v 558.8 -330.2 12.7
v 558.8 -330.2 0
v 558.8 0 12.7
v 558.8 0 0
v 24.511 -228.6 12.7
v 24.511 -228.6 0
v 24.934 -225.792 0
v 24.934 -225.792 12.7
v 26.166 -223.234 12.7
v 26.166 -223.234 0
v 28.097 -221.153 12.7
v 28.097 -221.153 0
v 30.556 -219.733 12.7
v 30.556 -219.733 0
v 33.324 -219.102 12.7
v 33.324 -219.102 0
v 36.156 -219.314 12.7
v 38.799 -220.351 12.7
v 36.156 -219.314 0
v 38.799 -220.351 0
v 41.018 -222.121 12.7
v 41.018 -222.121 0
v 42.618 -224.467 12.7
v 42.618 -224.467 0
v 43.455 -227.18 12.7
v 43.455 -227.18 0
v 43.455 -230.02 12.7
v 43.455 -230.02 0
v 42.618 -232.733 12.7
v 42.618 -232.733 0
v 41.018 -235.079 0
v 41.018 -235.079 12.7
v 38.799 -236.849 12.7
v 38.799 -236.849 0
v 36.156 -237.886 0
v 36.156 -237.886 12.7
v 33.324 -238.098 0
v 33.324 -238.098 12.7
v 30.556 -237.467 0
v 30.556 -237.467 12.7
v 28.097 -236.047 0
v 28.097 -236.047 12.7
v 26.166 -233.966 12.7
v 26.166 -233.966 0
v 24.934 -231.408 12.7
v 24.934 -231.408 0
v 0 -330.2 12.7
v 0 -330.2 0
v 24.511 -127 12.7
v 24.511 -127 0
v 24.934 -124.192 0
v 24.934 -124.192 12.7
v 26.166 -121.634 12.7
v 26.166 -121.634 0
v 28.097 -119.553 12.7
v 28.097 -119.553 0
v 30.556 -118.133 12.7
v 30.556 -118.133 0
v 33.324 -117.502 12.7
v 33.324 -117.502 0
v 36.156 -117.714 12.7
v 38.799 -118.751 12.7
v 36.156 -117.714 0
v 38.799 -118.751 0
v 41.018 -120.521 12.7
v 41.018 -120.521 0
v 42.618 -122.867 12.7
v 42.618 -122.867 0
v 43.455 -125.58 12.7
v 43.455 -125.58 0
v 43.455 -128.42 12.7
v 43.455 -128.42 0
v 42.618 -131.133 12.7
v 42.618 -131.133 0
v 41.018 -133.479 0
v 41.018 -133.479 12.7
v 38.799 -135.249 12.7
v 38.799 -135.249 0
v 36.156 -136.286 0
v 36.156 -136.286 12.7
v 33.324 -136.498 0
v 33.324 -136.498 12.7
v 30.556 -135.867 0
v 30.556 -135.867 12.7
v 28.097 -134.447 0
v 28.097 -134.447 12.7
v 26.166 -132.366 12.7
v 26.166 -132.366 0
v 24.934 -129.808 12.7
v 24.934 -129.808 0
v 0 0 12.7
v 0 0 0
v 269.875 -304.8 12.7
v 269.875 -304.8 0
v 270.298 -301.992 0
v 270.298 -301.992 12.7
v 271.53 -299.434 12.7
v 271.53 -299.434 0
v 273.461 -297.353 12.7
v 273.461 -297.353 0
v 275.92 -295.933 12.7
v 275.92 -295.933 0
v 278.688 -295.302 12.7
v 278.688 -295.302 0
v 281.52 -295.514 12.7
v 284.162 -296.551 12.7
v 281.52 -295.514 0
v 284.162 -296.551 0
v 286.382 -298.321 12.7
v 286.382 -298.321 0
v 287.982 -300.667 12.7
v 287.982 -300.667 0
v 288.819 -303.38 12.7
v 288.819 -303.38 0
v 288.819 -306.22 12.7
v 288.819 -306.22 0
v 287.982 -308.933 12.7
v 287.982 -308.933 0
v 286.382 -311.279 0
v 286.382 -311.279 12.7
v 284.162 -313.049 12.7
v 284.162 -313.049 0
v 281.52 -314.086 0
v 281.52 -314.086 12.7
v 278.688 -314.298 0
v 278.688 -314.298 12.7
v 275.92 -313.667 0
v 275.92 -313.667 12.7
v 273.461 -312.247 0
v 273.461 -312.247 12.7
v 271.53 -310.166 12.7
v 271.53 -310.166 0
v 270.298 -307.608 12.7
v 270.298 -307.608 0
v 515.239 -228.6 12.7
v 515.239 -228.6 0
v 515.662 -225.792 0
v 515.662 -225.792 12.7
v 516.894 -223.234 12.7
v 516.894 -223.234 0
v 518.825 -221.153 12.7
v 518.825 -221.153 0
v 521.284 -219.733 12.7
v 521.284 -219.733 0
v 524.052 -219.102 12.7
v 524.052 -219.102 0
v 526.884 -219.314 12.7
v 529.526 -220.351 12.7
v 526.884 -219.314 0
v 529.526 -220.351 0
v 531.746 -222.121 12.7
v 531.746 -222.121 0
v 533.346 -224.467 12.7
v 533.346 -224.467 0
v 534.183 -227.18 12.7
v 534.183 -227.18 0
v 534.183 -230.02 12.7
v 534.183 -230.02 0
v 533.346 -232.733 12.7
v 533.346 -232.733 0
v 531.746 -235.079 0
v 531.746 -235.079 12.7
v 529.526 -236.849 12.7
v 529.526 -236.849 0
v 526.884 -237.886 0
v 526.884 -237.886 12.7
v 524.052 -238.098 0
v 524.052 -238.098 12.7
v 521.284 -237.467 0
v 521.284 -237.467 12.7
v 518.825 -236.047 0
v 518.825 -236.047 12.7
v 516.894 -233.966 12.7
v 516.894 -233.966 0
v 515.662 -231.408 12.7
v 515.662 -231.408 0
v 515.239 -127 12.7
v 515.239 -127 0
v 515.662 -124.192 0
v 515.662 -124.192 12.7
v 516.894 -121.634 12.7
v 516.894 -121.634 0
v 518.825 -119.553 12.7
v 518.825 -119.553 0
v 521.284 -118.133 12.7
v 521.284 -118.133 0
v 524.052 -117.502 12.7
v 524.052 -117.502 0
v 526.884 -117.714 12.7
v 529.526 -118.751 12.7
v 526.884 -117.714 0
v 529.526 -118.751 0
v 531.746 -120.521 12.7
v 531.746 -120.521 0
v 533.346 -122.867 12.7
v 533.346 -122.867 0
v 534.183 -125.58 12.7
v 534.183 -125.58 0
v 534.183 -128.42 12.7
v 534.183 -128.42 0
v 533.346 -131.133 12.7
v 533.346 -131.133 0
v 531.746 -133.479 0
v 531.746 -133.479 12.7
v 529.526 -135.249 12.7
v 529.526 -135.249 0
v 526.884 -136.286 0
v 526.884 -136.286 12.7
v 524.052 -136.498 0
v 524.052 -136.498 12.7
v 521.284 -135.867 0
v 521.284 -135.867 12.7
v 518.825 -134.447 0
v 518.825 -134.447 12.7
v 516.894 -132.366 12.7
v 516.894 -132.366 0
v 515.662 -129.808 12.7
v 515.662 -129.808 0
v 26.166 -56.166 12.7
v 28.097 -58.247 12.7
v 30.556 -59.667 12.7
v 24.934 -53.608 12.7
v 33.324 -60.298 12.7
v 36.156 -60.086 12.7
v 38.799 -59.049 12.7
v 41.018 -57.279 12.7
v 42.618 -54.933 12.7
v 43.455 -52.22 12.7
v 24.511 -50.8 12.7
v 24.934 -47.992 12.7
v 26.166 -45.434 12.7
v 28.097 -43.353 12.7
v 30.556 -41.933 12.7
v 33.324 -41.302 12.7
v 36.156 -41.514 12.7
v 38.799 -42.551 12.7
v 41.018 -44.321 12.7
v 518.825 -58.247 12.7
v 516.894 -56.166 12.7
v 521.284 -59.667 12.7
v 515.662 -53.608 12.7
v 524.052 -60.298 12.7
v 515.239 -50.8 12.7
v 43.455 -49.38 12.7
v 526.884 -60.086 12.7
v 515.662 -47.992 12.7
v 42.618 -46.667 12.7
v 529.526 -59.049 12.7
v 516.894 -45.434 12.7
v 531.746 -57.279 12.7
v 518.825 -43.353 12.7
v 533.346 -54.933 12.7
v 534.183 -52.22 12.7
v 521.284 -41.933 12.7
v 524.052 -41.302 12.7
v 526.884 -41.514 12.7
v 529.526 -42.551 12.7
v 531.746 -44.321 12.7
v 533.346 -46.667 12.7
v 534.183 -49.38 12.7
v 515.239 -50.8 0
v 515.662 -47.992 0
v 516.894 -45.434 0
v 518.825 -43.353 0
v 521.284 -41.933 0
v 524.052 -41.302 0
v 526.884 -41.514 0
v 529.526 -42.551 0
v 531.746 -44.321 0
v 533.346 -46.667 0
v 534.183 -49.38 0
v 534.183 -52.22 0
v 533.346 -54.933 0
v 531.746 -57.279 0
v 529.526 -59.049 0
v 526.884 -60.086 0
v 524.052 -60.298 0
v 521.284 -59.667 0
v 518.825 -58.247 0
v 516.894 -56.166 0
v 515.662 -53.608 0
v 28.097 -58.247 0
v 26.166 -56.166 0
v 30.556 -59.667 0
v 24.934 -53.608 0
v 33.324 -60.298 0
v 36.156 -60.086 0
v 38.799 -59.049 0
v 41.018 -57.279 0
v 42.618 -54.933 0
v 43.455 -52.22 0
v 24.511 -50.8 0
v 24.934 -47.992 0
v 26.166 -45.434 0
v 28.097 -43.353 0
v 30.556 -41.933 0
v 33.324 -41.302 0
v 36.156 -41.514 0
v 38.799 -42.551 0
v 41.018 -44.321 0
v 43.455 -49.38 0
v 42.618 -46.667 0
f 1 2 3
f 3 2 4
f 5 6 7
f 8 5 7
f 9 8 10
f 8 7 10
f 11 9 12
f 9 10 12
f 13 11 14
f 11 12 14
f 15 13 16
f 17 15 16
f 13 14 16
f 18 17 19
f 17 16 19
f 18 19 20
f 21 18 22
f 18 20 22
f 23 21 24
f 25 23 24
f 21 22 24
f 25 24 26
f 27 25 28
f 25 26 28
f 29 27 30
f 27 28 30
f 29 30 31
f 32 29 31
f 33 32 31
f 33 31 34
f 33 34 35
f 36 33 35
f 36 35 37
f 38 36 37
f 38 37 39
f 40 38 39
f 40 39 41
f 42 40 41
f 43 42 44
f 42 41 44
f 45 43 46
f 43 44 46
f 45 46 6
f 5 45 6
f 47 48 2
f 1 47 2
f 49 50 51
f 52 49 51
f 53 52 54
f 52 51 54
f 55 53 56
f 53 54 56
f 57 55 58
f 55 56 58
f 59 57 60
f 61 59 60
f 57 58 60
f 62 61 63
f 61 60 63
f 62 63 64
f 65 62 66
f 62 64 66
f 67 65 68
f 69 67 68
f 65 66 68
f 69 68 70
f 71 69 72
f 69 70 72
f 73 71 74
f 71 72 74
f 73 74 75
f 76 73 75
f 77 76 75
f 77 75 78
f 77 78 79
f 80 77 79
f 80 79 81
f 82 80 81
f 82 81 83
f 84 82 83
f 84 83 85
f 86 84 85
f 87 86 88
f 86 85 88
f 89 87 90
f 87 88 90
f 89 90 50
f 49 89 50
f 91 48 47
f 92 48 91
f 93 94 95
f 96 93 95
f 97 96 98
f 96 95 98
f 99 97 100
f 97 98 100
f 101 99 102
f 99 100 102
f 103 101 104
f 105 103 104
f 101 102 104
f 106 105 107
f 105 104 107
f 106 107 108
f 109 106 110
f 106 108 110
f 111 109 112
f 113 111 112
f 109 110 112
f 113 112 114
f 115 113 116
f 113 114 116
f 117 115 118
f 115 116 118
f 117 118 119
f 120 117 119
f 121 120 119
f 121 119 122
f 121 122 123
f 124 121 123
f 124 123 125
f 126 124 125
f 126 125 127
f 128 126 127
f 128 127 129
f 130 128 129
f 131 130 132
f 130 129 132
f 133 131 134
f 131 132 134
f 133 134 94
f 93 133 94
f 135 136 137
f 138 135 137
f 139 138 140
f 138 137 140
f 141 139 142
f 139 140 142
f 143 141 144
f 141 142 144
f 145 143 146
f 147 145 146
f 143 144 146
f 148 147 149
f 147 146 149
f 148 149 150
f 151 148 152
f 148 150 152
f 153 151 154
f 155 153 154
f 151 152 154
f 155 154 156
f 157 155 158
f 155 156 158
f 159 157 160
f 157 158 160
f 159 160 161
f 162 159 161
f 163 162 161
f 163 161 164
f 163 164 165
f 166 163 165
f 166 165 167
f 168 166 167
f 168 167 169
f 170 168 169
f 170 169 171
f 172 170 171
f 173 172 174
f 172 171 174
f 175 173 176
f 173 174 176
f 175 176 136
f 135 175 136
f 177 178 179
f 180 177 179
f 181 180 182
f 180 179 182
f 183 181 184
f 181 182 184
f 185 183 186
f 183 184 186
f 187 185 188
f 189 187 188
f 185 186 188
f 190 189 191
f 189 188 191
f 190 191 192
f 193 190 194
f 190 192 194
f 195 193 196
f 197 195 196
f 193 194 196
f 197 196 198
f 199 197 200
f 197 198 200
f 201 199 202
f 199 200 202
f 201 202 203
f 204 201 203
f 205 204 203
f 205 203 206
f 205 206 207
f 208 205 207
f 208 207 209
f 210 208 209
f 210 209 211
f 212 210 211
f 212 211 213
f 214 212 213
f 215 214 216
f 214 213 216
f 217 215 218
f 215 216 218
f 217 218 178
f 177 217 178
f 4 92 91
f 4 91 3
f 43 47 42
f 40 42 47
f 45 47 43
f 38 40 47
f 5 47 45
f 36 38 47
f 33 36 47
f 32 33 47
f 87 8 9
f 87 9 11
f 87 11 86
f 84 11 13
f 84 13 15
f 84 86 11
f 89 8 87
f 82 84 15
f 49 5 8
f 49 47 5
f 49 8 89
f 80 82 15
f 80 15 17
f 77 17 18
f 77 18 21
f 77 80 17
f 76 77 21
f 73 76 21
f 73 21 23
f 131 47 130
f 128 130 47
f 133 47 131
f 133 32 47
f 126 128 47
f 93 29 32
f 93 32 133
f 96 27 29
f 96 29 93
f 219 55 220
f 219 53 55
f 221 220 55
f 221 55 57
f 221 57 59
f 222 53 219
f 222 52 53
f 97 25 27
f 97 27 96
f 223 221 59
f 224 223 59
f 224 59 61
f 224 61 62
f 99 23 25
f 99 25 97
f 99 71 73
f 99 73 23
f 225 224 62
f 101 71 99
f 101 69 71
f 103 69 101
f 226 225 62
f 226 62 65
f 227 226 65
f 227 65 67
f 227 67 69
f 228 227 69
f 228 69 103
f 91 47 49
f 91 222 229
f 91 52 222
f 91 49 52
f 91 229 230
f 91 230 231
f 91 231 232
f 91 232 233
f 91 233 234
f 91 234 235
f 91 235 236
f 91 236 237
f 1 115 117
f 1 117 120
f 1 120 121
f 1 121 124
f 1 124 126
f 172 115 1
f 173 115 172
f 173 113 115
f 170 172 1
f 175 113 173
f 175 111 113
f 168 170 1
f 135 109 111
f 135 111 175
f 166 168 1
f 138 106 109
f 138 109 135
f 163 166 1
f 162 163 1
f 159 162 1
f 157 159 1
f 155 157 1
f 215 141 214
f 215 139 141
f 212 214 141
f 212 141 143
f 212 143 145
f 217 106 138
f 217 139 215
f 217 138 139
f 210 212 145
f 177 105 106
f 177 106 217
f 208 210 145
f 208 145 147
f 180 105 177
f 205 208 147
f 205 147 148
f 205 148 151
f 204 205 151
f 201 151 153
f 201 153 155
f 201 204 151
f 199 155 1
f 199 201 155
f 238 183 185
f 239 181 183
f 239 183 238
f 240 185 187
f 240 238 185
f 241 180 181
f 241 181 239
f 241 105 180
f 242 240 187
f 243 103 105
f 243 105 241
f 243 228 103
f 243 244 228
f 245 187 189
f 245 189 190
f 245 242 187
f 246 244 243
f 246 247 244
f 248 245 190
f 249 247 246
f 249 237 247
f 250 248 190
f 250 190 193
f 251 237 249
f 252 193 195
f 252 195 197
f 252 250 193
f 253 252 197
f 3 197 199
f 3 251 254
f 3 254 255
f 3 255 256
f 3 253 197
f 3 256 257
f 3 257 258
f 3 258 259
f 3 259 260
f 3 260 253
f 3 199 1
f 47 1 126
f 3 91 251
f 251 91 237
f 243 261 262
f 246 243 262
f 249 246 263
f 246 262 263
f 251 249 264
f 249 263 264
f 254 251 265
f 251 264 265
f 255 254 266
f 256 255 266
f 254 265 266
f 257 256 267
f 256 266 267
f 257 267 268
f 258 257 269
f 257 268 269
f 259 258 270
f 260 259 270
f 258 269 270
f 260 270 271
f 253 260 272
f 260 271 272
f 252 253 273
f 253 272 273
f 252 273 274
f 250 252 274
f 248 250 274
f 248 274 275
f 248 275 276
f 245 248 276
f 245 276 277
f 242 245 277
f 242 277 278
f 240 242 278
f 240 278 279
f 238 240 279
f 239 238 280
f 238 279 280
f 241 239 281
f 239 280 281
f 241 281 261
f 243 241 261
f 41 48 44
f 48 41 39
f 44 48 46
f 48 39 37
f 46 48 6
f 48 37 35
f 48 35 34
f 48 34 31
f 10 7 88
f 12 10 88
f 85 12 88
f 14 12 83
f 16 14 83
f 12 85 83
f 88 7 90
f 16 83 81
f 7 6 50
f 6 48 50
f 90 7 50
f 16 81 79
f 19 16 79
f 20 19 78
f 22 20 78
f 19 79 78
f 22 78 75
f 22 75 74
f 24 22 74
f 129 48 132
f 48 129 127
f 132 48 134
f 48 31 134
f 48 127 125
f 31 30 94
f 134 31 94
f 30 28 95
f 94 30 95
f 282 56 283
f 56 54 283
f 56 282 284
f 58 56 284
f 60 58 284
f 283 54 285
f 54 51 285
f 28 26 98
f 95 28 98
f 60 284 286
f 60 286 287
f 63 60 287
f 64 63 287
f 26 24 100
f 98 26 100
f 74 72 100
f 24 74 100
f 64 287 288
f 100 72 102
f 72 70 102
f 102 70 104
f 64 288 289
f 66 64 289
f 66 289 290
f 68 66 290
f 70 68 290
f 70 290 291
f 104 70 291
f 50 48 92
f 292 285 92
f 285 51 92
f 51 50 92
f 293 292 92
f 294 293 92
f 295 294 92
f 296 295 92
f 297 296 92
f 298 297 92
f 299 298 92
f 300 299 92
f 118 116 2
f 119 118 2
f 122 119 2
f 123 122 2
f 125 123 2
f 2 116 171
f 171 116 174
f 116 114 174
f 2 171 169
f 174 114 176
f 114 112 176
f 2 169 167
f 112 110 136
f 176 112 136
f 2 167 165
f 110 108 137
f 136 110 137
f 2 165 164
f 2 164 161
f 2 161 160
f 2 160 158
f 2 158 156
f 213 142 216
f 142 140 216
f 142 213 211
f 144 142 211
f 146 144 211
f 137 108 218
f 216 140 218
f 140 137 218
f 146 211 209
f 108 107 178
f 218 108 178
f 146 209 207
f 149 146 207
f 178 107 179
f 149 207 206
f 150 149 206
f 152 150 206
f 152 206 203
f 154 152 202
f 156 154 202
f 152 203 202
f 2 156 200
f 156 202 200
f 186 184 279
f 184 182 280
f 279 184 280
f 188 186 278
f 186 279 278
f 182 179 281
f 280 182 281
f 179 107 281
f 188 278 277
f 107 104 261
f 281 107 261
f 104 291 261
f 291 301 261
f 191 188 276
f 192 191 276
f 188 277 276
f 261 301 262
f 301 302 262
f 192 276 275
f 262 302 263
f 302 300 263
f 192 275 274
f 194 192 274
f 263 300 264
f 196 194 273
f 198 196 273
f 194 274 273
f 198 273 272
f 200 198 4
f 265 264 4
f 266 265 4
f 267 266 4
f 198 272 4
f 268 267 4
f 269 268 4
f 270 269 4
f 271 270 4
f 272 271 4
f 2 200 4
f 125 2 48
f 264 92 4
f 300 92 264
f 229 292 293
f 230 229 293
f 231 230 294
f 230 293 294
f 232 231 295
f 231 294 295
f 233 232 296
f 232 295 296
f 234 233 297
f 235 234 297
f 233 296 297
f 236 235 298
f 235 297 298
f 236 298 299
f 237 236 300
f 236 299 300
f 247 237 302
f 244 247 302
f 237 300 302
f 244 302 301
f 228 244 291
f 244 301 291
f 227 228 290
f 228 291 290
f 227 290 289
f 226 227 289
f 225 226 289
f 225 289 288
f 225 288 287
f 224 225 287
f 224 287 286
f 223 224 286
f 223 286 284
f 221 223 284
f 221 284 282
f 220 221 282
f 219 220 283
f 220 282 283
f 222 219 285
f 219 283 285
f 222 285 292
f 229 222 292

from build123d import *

# Parameters (mm, degrees)
SKETCH1_W           = 558.8
SKETCH1_H           = 330.2
BOSS_EXTRUDE1_DEPTH = 12.7
SKETCH4_R           = 9.525
CUT_EXTRUDE1_DEPTH  = 12.7


with BuildPart() as part:
    # Sketch1 → Boss-Extrude1 (new body)
    with BuildSketch(Plane.XY):
        with Locations((279.4, -165.1)):
            Rectangle(SKETCH1_W, SKETCH1_H)
    extrude(amount=BOSS_EXTRUDE1_DEPTH)

    # Sketch4 → Cut-Extrude1 (cut)
    with BuildSketch(Plane(origin=(0, 0, 0), x_dir=(-1, 0, 0), z_dir=(0, 0, -1))):
        with Locations((-279.4, -304.8)):
            Circle(SKETCH4_R)
        with Locations((-524.764, -228.6)):
            Circle(SKETCH4_R)
        with Locations((-524.764, -127)):
            Circle(SKETCH4_R)
        with Locations((-34.036, -228.6)):
            Circle(SKETCH4_R)
        with Locations((-34.036, -127)):
            Circle(SKETCH4_R)
        with Locations((-524.764, -50.8)):
            Circle(SKETCH4_R)
        with Locations((-34.036, -50.8)):
            Circle(SKETCH4_R)
    extrude(amount=-CUT_EXTRUDE1_DEPTH, mode=Mode.SUBTRACT)


solid = part.part
